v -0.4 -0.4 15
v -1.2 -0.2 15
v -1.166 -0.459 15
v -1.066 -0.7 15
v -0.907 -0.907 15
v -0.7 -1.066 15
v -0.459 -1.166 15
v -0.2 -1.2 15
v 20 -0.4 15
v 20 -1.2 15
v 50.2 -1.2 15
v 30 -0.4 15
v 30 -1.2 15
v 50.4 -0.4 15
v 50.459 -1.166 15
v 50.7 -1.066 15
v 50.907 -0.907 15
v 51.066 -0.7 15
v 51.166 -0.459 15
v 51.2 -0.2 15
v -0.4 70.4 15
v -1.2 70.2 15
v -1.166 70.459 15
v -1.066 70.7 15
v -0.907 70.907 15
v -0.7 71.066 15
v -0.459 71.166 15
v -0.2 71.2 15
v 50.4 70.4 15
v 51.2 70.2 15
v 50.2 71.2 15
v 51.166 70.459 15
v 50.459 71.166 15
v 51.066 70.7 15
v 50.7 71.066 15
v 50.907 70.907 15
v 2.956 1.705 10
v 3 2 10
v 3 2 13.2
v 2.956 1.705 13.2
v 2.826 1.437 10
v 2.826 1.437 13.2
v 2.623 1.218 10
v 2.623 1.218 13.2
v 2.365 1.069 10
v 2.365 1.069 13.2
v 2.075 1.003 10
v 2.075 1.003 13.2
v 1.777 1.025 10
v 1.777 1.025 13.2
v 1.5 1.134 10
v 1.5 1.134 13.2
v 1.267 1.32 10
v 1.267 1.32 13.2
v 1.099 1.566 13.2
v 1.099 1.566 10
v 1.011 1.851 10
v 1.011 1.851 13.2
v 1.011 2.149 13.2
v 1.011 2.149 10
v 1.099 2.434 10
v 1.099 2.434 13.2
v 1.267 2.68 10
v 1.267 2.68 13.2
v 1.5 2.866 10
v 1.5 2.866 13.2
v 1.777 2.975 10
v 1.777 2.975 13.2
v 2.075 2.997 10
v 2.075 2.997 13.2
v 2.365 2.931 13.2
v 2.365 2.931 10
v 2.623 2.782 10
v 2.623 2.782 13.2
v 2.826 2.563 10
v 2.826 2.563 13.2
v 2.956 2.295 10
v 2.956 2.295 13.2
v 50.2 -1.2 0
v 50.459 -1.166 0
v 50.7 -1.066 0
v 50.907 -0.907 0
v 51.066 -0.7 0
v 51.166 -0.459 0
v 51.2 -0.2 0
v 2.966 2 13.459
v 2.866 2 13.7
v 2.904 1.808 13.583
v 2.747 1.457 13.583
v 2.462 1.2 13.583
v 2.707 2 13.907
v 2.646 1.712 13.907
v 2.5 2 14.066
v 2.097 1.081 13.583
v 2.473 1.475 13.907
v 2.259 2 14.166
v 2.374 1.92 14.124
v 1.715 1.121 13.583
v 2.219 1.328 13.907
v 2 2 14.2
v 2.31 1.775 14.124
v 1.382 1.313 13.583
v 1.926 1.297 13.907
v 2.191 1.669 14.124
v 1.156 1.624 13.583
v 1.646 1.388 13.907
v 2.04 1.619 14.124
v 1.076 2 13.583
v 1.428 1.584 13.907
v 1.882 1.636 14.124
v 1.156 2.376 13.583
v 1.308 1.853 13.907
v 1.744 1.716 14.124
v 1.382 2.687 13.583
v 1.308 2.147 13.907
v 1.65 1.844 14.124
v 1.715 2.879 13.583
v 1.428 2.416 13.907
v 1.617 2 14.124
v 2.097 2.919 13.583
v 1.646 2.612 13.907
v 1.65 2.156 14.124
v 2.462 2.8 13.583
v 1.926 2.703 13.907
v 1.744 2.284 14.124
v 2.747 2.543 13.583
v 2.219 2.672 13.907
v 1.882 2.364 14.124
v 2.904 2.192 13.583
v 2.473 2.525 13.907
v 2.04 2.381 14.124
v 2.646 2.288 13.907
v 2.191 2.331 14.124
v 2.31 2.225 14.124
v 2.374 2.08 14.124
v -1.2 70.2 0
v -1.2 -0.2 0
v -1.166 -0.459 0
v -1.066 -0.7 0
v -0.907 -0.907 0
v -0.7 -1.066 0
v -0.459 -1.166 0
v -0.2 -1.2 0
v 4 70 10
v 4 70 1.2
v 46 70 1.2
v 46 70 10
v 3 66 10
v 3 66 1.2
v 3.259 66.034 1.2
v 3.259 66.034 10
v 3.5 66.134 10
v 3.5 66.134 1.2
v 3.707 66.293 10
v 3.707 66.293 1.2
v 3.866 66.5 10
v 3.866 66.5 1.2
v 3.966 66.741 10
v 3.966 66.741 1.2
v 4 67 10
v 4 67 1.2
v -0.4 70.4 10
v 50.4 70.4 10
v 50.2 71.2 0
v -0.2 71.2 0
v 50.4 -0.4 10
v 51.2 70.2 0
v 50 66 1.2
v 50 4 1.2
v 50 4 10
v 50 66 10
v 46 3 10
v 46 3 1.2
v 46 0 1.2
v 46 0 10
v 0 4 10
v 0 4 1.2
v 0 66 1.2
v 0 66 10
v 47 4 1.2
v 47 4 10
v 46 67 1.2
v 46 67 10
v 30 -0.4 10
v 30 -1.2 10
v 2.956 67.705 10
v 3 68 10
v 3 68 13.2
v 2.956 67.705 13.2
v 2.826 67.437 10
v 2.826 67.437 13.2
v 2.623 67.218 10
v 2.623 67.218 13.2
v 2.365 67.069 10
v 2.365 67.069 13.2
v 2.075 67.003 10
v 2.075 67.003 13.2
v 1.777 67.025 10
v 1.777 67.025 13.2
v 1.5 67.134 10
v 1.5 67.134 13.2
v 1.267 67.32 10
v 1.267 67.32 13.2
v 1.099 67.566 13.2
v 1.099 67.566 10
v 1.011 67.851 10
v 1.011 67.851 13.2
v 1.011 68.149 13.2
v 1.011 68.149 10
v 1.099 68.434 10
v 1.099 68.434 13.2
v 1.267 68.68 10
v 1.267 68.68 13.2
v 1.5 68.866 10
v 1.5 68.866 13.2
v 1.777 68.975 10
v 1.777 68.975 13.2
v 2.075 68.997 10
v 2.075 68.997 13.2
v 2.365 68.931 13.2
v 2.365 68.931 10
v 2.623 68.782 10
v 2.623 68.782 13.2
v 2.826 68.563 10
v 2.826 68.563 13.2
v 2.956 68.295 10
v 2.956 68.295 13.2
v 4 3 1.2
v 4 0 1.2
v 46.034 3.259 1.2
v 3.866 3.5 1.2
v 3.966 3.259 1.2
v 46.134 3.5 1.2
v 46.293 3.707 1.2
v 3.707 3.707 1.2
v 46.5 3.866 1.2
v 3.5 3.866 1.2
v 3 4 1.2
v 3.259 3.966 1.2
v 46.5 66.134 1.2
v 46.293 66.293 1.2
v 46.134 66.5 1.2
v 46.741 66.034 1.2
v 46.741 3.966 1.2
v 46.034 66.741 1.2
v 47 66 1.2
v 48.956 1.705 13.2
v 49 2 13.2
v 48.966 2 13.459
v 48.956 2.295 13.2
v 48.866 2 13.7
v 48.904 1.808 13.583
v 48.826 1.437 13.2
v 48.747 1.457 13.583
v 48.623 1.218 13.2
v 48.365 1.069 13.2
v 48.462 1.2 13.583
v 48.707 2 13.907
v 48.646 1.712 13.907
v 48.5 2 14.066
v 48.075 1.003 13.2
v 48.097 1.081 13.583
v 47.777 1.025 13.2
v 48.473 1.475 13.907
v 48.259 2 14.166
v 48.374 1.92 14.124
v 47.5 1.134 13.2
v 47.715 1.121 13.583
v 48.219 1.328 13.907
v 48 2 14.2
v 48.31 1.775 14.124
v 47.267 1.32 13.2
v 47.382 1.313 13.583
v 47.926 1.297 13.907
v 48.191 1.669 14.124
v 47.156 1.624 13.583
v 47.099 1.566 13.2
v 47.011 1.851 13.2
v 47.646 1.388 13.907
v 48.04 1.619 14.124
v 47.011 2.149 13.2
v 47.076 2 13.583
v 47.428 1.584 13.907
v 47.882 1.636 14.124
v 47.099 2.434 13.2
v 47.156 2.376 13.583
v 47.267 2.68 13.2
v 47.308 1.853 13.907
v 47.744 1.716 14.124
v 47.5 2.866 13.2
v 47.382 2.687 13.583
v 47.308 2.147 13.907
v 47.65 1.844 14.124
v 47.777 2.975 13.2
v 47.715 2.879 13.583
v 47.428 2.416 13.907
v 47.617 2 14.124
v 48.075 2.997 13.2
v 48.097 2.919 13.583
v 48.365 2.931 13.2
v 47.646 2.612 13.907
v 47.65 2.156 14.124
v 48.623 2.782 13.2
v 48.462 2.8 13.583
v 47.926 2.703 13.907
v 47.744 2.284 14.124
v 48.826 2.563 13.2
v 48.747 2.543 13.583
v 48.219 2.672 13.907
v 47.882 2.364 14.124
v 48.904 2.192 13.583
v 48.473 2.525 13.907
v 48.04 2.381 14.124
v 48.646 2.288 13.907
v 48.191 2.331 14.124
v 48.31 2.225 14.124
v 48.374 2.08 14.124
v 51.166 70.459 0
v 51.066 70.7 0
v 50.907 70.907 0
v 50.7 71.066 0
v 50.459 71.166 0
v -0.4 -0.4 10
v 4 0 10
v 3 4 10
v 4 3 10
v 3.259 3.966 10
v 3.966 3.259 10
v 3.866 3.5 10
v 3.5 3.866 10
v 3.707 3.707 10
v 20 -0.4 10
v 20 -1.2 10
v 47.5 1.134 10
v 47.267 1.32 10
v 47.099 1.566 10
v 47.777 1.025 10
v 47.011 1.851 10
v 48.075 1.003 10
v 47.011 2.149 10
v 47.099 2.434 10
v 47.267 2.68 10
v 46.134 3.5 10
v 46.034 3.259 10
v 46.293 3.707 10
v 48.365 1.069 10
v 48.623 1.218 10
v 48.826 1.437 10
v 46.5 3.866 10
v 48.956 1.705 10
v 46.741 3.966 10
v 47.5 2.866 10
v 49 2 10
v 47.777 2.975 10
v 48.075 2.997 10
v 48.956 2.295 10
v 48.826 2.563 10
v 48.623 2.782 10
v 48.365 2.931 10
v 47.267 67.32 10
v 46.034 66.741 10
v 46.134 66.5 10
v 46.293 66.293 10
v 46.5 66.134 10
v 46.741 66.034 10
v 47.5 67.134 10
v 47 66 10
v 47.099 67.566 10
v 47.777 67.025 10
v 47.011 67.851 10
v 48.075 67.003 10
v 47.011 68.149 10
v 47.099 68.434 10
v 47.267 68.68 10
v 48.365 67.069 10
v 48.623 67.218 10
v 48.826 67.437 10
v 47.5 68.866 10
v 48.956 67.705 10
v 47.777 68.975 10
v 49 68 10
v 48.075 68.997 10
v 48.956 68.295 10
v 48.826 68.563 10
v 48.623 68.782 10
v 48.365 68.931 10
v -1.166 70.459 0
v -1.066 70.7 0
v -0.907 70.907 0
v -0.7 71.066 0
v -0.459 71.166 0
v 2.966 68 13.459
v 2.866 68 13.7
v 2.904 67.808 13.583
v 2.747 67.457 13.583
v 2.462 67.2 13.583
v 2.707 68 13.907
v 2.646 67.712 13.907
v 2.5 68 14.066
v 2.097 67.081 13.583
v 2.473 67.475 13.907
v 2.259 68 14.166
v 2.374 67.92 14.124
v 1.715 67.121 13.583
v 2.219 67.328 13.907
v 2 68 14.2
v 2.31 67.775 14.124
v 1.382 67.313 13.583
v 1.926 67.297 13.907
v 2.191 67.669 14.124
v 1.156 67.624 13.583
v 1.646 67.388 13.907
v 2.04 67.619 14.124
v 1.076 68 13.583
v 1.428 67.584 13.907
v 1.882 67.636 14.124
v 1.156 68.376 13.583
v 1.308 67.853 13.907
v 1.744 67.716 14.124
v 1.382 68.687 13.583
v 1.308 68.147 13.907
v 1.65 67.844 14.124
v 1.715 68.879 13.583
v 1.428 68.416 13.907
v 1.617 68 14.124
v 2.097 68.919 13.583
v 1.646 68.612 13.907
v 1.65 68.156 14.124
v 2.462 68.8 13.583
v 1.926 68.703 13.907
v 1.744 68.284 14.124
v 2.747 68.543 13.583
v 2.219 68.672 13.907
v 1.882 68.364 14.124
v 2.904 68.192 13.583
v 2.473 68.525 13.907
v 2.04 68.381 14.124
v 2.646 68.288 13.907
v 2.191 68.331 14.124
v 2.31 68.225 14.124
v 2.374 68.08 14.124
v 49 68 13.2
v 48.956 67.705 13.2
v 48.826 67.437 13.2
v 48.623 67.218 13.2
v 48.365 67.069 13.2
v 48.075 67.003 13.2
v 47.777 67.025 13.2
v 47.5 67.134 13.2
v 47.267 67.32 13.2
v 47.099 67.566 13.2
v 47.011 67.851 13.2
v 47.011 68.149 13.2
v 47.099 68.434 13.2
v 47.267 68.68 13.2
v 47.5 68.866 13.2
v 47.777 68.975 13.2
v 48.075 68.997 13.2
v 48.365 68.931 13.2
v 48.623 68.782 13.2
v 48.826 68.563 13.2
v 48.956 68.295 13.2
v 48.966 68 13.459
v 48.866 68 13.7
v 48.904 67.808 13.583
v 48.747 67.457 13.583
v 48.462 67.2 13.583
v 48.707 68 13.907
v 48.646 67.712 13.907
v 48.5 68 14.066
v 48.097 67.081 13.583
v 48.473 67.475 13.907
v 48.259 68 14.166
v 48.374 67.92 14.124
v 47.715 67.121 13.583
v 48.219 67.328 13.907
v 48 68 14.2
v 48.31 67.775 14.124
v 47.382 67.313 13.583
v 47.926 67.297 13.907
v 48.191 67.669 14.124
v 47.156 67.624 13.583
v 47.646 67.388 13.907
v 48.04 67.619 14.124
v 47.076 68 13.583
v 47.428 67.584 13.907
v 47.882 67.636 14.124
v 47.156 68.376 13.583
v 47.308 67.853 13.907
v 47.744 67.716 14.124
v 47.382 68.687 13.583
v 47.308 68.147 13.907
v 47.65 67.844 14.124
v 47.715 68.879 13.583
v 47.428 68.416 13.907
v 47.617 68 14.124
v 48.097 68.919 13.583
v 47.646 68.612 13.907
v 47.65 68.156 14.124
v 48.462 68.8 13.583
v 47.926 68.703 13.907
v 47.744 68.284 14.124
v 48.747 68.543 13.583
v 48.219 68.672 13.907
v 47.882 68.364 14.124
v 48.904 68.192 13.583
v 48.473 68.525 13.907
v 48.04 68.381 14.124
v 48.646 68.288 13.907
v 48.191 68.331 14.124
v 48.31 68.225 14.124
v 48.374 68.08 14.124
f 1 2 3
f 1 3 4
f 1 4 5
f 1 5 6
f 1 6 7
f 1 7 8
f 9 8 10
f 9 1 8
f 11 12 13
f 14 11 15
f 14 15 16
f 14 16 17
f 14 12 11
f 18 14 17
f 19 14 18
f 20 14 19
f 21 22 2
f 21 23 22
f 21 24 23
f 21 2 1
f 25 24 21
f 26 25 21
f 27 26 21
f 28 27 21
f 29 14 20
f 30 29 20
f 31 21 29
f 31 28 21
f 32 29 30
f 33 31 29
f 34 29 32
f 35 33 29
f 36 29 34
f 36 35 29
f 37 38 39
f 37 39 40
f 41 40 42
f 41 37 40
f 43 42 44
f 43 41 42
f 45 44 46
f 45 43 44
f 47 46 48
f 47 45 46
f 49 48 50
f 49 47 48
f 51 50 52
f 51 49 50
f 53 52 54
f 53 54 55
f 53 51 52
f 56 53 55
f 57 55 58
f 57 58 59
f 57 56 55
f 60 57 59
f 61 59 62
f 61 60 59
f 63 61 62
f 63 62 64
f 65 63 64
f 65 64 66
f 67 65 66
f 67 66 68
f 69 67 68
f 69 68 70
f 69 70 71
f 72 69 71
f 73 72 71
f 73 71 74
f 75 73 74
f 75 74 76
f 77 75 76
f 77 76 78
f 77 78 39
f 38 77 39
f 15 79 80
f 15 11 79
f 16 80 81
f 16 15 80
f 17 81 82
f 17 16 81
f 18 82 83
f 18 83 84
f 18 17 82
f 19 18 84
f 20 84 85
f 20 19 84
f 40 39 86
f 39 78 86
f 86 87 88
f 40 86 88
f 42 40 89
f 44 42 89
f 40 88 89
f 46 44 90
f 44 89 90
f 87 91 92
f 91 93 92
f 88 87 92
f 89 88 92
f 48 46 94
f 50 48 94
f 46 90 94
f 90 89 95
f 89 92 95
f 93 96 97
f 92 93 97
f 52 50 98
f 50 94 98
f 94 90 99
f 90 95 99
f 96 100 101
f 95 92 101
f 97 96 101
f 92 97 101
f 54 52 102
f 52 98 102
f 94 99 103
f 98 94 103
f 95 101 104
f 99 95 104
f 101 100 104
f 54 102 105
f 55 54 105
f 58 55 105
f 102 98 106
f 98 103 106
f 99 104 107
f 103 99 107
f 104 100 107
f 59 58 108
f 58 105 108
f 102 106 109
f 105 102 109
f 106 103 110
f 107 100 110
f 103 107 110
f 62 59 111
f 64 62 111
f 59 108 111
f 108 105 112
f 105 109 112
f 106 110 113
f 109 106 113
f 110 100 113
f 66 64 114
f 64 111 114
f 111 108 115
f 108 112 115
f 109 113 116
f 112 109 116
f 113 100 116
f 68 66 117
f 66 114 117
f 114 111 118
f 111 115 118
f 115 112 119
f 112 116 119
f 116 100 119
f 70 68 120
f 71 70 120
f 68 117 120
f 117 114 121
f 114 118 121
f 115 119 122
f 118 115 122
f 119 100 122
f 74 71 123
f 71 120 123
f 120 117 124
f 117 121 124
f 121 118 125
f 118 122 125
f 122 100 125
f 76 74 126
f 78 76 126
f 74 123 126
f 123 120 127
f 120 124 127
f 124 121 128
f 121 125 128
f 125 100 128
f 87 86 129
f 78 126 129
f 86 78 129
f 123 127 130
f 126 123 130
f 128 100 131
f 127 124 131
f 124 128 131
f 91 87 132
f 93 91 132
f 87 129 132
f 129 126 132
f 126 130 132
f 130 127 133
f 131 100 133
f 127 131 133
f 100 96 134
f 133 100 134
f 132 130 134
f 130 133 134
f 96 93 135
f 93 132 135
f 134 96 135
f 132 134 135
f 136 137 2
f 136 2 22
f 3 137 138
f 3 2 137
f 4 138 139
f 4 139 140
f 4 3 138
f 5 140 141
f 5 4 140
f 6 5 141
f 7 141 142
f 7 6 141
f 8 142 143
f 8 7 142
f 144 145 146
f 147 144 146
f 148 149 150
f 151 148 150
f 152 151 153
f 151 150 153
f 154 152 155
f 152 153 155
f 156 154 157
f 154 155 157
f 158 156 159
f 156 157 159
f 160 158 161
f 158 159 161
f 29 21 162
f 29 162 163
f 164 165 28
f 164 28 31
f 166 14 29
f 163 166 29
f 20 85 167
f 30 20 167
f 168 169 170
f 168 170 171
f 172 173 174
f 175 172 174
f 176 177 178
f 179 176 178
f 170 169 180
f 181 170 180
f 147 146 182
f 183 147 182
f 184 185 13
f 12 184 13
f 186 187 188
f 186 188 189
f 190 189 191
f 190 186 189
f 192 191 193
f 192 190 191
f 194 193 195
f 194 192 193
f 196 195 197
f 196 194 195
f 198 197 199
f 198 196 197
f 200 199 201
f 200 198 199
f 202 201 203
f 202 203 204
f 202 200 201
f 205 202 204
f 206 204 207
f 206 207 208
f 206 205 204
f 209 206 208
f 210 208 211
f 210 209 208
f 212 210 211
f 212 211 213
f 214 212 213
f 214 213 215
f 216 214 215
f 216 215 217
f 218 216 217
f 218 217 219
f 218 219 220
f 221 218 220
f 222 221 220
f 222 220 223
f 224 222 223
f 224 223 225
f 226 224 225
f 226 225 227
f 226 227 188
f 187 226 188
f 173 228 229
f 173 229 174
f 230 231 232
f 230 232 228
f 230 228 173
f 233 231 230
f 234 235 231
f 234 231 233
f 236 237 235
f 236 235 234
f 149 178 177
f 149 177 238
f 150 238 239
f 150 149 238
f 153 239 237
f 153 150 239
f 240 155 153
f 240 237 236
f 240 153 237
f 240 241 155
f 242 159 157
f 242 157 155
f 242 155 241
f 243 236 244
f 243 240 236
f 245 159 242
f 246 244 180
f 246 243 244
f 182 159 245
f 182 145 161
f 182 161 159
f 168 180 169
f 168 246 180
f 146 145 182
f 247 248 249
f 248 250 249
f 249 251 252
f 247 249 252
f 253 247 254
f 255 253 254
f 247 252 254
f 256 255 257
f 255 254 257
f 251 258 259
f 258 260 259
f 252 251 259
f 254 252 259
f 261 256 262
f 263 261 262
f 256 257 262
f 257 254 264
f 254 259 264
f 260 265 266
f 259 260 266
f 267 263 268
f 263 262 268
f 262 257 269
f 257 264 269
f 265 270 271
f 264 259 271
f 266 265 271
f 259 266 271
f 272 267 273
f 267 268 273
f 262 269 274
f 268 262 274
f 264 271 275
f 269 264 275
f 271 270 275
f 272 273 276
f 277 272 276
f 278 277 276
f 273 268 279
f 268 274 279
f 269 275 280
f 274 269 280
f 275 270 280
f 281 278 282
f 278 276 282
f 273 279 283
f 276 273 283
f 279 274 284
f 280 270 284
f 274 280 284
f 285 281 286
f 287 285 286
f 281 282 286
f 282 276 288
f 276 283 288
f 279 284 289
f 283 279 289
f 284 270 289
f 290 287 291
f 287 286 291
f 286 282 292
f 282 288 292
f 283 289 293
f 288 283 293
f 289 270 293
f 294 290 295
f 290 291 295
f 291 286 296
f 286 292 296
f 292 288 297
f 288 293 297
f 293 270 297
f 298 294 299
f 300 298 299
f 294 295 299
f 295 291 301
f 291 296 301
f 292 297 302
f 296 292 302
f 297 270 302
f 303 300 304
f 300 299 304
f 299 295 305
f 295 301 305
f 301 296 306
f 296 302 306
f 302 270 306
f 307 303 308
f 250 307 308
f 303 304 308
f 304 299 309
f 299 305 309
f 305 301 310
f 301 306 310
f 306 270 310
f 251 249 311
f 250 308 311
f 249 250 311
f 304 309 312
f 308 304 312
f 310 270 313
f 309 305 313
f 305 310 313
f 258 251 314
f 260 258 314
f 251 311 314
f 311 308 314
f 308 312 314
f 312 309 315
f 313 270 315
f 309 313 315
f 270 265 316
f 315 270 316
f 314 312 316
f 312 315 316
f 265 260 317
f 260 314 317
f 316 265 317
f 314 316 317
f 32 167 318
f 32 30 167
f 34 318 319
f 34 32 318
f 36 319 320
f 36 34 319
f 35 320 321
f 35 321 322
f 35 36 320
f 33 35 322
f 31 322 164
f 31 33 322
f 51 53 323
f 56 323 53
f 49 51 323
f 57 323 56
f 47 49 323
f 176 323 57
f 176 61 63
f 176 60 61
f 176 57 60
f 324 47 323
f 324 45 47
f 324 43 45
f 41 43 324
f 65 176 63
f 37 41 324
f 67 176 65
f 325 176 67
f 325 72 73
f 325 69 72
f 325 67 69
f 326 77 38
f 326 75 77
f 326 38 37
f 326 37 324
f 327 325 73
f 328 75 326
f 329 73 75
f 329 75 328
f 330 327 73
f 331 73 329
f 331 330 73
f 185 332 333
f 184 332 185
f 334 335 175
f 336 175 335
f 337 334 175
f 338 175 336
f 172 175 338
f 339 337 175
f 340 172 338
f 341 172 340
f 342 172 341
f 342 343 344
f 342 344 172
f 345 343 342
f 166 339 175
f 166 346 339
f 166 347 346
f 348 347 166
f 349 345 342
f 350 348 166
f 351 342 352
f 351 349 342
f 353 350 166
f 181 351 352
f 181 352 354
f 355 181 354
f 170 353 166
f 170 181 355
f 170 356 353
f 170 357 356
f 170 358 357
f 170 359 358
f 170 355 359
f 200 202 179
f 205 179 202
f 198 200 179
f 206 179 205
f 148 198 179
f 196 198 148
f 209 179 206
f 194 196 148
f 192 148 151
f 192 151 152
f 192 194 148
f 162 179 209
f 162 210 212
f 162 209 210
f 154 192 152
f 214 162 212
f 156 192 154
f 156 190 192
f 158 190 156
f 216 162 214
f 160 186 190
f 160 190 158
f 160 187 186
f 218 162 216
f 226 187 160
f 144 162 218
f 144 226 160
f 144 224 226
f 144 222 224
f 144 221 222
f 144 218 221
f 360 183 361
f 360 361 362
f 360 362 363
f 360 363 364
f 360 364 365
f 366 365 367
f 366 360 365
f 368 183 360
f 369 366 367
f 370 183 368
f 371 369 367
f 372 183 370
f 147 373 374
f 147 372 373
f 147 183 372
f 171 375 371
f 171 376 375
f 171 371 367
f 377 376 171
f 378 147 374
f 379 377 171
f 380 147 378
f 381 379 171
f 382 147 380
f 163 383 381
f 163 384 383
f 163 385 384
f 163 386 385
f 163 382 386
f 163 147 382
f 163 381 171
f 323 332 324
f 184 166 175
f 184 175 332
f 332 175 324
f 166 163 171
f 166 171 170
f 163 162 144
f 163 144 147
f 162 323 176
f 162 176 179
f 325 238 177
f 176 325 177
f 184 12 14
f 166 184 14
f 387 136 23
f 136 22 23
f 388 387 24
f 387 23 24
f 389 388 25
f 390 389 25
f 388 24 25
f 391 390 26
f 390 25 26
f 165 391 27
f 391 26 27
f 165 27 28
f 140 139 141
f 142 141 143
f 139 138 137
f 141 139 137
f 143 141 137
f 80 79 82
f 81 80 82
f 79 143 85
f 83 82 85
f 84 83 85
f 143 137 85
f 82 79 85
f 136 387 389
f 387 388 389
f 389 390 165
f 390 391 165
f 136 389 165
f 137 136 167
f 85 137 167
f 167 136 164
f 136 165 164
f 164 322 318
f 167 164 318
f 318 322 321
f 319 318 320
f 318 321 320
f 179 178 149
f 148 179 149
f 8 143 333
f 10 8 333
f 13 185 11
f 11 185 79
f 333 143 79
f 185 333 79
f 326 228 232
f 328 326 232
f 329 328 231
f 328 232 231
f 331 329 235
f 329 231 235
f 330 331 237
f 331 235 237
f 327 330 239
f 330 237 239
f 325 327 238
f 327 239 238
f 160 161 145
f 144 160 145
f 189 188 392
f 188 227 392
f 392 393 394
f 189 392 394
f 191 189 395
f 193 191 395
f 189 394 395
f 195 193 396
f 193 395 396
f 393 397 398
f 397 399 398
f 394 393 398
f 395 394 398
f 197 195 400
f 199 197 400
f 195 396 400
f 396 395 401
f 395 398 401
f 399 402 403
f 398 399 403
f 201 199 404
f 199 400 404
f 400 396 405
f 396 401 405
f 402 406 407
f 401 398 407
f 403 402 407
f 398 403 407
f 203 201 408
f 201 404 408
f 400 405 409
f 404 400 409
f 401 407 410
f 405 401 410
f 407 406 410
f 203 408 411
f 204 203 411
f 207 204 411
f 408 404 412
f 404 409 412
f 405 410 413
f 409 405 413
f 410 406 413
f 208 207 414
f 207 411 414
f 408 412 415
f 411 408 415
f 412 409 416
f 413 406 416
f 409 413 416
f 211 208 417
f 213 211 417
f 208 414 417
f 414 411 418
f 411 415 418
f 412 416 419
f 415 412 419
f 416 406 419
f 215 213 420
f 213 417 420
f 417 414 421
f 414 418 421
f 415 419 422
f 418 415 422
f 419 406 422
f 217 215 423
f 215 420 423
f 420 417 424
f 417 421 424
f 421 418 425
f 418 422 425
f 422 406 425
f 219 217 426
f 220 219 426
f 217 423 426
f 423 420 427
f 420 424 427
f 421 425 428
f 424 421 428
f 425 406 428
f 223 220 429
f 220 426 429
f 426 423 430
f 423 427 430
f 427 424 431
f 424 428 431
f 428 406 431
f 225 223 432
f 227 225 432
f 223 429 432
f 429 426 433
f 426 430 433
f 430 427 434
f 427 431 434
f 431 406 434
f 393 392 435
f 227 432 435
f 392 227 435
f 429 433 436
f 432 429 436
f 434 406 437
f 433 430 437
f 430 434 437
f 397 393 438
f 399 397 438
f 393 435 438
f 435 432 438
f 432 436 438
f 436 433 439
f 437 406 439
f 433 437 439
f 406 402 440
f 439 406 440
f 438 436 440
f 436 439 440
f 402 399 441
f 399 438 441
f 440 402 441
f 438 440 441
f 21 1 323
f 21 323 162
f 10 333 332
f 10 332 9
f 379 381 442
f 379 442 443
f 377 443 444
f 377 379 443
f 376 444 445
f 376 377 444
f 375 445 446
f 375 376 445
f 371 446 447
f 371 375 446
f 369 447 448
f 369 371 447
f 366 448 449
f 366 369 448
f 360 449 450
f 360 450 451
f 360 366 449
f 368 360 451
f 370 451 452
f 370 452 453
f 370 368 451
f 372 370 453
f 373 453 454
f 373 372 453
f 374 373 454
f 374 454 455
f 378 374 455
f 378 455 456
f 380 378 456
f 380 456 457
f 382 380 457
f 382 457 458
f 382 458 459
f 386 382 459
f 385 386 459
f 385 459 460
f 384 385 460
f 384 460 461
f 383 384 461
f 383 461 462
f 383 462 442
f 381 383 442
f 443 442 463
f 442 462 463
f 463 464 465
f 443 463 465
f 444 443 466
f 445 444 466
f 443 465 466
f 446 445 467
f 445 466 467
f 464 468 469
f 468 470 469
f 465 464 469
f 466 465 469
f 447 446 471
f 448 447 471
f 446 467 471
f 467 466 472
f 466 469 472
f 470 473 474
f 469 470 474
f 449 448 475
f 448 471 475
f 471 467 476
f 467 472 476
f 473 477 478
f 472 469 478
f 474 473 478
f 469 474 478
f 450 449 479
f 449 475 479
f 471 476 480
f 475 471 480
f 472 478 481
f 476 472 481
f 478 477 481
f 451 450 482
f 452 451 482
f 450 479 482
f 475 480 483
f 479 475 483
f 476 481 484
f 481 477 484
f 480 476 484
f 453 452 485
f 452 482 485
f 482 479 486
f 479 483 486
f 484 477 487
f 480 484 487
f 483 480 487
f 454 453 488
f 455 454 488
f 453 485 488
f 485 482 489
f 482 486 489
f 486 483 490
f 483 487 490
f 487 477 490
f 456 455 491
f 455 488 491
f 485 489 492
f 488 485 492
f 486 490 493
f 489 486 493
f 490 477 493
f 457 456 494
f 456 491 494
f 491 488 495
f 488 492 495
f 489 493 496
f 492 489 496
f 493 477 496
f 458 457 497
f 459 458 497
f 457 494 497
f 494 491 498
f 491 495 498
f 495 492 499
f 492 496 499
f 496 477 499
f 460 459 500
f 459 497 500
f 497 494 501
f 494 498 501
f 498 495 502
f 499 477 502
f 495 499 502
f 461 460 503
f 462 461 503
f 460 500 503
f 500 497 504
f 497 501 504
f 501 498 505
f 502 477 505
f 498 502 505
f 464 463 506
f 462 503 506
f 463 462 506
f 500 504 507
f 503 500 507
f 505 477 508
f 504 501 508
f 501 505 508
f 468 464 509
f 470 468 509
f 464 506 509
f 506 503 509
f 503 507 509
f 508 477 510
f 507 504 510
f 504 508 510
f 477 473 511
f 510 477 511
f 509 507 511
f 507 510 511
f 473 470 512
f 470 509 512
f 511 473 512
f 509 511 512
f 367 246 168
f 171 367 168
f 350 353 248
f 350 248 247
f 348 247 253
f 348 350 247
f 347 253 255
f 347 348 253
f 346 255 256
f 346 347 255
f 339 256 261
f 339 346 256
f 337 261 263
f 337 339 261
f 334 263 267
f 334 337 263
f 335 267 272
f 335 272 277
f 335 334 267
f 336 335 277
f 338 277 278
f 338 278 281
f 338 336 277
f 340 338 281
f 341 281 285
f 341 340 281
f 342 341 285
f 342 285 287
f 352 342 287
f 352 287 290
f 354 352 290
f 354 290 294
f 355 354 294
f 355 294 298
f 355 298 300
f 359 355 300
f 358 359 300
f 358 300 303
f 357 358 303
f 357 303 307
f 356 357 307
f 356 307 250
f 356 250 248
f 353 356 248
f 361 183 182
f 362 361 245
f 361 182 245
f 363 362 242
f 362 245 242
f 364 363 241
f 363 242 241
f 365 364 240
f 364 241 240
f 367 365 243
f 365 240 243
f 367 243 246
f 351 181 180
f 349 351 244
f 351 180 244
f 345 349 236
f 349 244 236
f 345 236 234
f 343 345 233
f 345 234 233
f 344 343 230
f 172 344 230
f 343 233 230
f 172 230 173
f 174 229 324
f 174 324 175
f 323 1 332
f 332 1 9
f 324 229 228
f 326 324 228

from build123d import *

# Parameters (mm, degrees)
F1_W      = 52.4
F1_H      = 72.4
F2_DEPTH  = 15
F3_T      = -1.2
F0_R      = 1
F4_DEPTH  = 10
F5_DEPTH  = 13
F6_R      = 1
F8_W      = 50.8
F8_H      = 70.8
F8_W_2    = 50
F8_H_2    = 70
F9_DEPTH  = 5
F10_W     = 10
F10_H     = 10
F11_DEPTH = 25


# Not quite as in the source:
# - two fillets or chamfers of one size are made in one step


with BuildPart() as f2:
    # F1 (on Top) → F2 (new body)
    with BuildSketch(Plane.XY):
        with Locations((25, 35)):
            Rectangle(F1_W, F1_H)
    extrude(amount=F2_DEPTH)

    # F3
    f3_openings = [f2.faces().sort_by_distance(p)[0] for p in [
        (25, 35, 15),
    ]]
    offset(amount=F3_T, openings=f3_openings)

    # F0 (on Top) → F4 (join)
    with BuildSketch(Plane.XY):
        with BuildLine():
            Line((4, 70), (0, 70))
            Line((0, 70), (0, 66))
            Line((0, 66), (3, 66))
            ThreePointArc((3, 66), (3.7071067812, 66.2928932188), (4, 67))
            Line((4, 67), (4, 70))
        make_face()
        with Locations((2, 68)):
            Circle(F0_R, mode=Mode.SUBTRACT)
        with BuildLine():
            Line((47, 66), (50, 66))
            Line((50, 66), (50, 70))
            Line((50, 70), (46, 70))
            Line((46, 70), (46, 67))
            ThreePointArc((46, 67), (46.2928932188, 66.2928932188), (47, 66))
        make_face()
        with Locations((48, 68)):
            Circle(F0_R, mode=Mode.SUBTRACT)
        with BuildLine():
            Line((50, 0), (50, 4))
            Line((50, 4), (47, 4))
            ThreePointArc((47, 4), (46.2928932188, 3.7071067812), (46, 3))
            Line((46, 3), (46, 0))
            Line((46, 0), (50, 0))
        make_face()
        with Locations((48, 2)):
            Circle(F0_R, mode=Mode.SUBTRACT)
        with BuildLine():
            ThreePointArc((4, 3), (3.7071067812, 3.7071067812), (3, 4))
            Line((3, 4), (0, 4))
            Line((0, 4), (0, 0))
            Line((0, 0), (4, 0))
            Line((4, 0), (4, 3))
        make_face()
        with Locations((2, 2)):
            Circle(F0_R, mode=Mode.SUBTRACT)
    extrude(amount=F4_DEPTH)

    # F5 (add): faces of the model
    f5_faces = [f2.faces().sort_by_distance(p)[0] for p in [
        (2, 2, 1.2),
        (48, 2, 1.2),
        (2, 68, 1.2),
        (48, 68, 1.2),
    ]]
    extrude(f5_faces, amount=F5_DEPTH)

    # F6
    f6_edges = [f2.edges().sort_by_distance(p)[0] for p in [
        (1, 2, 14.2),
        (47, 2, 14.2),
        (1, 68, 14.2),
        (47, 68, 14.2),
        (-1.2, -1.2, 7.5),
        (51.2, -1.2, 7.5),
        (-1.2, 71.2, 7.5),
        (51.2, 71.2, 7.5),
    ]]
    fillet(f6_edges, radius=F6_R)

    # F8 (on face) → F9 (cut)
    with BuildSketch(Plane.XY.offset(15)):
        with Locations((25, 35)):
            Rectangle(F8_W, F8_H)
        with Locations((25, 35)):
            Rectangle(F8_W_2, F8_H_2, mode=Mode.SUBTRACT)
    extrude(amount=-F9_DEPTH, mode=Mode.SUBTRACT)

    # F10 (on face) → F11 (cut)
    with BuildSketch(Plane.XZ.offset(1.2)):
        with Locations((25, 15)):
            Rectangle(F10_W, F10_H)
    extrude(amount=-F11_DEPTH, mode=Mode.SUBTRACT)


solid = f2.part
